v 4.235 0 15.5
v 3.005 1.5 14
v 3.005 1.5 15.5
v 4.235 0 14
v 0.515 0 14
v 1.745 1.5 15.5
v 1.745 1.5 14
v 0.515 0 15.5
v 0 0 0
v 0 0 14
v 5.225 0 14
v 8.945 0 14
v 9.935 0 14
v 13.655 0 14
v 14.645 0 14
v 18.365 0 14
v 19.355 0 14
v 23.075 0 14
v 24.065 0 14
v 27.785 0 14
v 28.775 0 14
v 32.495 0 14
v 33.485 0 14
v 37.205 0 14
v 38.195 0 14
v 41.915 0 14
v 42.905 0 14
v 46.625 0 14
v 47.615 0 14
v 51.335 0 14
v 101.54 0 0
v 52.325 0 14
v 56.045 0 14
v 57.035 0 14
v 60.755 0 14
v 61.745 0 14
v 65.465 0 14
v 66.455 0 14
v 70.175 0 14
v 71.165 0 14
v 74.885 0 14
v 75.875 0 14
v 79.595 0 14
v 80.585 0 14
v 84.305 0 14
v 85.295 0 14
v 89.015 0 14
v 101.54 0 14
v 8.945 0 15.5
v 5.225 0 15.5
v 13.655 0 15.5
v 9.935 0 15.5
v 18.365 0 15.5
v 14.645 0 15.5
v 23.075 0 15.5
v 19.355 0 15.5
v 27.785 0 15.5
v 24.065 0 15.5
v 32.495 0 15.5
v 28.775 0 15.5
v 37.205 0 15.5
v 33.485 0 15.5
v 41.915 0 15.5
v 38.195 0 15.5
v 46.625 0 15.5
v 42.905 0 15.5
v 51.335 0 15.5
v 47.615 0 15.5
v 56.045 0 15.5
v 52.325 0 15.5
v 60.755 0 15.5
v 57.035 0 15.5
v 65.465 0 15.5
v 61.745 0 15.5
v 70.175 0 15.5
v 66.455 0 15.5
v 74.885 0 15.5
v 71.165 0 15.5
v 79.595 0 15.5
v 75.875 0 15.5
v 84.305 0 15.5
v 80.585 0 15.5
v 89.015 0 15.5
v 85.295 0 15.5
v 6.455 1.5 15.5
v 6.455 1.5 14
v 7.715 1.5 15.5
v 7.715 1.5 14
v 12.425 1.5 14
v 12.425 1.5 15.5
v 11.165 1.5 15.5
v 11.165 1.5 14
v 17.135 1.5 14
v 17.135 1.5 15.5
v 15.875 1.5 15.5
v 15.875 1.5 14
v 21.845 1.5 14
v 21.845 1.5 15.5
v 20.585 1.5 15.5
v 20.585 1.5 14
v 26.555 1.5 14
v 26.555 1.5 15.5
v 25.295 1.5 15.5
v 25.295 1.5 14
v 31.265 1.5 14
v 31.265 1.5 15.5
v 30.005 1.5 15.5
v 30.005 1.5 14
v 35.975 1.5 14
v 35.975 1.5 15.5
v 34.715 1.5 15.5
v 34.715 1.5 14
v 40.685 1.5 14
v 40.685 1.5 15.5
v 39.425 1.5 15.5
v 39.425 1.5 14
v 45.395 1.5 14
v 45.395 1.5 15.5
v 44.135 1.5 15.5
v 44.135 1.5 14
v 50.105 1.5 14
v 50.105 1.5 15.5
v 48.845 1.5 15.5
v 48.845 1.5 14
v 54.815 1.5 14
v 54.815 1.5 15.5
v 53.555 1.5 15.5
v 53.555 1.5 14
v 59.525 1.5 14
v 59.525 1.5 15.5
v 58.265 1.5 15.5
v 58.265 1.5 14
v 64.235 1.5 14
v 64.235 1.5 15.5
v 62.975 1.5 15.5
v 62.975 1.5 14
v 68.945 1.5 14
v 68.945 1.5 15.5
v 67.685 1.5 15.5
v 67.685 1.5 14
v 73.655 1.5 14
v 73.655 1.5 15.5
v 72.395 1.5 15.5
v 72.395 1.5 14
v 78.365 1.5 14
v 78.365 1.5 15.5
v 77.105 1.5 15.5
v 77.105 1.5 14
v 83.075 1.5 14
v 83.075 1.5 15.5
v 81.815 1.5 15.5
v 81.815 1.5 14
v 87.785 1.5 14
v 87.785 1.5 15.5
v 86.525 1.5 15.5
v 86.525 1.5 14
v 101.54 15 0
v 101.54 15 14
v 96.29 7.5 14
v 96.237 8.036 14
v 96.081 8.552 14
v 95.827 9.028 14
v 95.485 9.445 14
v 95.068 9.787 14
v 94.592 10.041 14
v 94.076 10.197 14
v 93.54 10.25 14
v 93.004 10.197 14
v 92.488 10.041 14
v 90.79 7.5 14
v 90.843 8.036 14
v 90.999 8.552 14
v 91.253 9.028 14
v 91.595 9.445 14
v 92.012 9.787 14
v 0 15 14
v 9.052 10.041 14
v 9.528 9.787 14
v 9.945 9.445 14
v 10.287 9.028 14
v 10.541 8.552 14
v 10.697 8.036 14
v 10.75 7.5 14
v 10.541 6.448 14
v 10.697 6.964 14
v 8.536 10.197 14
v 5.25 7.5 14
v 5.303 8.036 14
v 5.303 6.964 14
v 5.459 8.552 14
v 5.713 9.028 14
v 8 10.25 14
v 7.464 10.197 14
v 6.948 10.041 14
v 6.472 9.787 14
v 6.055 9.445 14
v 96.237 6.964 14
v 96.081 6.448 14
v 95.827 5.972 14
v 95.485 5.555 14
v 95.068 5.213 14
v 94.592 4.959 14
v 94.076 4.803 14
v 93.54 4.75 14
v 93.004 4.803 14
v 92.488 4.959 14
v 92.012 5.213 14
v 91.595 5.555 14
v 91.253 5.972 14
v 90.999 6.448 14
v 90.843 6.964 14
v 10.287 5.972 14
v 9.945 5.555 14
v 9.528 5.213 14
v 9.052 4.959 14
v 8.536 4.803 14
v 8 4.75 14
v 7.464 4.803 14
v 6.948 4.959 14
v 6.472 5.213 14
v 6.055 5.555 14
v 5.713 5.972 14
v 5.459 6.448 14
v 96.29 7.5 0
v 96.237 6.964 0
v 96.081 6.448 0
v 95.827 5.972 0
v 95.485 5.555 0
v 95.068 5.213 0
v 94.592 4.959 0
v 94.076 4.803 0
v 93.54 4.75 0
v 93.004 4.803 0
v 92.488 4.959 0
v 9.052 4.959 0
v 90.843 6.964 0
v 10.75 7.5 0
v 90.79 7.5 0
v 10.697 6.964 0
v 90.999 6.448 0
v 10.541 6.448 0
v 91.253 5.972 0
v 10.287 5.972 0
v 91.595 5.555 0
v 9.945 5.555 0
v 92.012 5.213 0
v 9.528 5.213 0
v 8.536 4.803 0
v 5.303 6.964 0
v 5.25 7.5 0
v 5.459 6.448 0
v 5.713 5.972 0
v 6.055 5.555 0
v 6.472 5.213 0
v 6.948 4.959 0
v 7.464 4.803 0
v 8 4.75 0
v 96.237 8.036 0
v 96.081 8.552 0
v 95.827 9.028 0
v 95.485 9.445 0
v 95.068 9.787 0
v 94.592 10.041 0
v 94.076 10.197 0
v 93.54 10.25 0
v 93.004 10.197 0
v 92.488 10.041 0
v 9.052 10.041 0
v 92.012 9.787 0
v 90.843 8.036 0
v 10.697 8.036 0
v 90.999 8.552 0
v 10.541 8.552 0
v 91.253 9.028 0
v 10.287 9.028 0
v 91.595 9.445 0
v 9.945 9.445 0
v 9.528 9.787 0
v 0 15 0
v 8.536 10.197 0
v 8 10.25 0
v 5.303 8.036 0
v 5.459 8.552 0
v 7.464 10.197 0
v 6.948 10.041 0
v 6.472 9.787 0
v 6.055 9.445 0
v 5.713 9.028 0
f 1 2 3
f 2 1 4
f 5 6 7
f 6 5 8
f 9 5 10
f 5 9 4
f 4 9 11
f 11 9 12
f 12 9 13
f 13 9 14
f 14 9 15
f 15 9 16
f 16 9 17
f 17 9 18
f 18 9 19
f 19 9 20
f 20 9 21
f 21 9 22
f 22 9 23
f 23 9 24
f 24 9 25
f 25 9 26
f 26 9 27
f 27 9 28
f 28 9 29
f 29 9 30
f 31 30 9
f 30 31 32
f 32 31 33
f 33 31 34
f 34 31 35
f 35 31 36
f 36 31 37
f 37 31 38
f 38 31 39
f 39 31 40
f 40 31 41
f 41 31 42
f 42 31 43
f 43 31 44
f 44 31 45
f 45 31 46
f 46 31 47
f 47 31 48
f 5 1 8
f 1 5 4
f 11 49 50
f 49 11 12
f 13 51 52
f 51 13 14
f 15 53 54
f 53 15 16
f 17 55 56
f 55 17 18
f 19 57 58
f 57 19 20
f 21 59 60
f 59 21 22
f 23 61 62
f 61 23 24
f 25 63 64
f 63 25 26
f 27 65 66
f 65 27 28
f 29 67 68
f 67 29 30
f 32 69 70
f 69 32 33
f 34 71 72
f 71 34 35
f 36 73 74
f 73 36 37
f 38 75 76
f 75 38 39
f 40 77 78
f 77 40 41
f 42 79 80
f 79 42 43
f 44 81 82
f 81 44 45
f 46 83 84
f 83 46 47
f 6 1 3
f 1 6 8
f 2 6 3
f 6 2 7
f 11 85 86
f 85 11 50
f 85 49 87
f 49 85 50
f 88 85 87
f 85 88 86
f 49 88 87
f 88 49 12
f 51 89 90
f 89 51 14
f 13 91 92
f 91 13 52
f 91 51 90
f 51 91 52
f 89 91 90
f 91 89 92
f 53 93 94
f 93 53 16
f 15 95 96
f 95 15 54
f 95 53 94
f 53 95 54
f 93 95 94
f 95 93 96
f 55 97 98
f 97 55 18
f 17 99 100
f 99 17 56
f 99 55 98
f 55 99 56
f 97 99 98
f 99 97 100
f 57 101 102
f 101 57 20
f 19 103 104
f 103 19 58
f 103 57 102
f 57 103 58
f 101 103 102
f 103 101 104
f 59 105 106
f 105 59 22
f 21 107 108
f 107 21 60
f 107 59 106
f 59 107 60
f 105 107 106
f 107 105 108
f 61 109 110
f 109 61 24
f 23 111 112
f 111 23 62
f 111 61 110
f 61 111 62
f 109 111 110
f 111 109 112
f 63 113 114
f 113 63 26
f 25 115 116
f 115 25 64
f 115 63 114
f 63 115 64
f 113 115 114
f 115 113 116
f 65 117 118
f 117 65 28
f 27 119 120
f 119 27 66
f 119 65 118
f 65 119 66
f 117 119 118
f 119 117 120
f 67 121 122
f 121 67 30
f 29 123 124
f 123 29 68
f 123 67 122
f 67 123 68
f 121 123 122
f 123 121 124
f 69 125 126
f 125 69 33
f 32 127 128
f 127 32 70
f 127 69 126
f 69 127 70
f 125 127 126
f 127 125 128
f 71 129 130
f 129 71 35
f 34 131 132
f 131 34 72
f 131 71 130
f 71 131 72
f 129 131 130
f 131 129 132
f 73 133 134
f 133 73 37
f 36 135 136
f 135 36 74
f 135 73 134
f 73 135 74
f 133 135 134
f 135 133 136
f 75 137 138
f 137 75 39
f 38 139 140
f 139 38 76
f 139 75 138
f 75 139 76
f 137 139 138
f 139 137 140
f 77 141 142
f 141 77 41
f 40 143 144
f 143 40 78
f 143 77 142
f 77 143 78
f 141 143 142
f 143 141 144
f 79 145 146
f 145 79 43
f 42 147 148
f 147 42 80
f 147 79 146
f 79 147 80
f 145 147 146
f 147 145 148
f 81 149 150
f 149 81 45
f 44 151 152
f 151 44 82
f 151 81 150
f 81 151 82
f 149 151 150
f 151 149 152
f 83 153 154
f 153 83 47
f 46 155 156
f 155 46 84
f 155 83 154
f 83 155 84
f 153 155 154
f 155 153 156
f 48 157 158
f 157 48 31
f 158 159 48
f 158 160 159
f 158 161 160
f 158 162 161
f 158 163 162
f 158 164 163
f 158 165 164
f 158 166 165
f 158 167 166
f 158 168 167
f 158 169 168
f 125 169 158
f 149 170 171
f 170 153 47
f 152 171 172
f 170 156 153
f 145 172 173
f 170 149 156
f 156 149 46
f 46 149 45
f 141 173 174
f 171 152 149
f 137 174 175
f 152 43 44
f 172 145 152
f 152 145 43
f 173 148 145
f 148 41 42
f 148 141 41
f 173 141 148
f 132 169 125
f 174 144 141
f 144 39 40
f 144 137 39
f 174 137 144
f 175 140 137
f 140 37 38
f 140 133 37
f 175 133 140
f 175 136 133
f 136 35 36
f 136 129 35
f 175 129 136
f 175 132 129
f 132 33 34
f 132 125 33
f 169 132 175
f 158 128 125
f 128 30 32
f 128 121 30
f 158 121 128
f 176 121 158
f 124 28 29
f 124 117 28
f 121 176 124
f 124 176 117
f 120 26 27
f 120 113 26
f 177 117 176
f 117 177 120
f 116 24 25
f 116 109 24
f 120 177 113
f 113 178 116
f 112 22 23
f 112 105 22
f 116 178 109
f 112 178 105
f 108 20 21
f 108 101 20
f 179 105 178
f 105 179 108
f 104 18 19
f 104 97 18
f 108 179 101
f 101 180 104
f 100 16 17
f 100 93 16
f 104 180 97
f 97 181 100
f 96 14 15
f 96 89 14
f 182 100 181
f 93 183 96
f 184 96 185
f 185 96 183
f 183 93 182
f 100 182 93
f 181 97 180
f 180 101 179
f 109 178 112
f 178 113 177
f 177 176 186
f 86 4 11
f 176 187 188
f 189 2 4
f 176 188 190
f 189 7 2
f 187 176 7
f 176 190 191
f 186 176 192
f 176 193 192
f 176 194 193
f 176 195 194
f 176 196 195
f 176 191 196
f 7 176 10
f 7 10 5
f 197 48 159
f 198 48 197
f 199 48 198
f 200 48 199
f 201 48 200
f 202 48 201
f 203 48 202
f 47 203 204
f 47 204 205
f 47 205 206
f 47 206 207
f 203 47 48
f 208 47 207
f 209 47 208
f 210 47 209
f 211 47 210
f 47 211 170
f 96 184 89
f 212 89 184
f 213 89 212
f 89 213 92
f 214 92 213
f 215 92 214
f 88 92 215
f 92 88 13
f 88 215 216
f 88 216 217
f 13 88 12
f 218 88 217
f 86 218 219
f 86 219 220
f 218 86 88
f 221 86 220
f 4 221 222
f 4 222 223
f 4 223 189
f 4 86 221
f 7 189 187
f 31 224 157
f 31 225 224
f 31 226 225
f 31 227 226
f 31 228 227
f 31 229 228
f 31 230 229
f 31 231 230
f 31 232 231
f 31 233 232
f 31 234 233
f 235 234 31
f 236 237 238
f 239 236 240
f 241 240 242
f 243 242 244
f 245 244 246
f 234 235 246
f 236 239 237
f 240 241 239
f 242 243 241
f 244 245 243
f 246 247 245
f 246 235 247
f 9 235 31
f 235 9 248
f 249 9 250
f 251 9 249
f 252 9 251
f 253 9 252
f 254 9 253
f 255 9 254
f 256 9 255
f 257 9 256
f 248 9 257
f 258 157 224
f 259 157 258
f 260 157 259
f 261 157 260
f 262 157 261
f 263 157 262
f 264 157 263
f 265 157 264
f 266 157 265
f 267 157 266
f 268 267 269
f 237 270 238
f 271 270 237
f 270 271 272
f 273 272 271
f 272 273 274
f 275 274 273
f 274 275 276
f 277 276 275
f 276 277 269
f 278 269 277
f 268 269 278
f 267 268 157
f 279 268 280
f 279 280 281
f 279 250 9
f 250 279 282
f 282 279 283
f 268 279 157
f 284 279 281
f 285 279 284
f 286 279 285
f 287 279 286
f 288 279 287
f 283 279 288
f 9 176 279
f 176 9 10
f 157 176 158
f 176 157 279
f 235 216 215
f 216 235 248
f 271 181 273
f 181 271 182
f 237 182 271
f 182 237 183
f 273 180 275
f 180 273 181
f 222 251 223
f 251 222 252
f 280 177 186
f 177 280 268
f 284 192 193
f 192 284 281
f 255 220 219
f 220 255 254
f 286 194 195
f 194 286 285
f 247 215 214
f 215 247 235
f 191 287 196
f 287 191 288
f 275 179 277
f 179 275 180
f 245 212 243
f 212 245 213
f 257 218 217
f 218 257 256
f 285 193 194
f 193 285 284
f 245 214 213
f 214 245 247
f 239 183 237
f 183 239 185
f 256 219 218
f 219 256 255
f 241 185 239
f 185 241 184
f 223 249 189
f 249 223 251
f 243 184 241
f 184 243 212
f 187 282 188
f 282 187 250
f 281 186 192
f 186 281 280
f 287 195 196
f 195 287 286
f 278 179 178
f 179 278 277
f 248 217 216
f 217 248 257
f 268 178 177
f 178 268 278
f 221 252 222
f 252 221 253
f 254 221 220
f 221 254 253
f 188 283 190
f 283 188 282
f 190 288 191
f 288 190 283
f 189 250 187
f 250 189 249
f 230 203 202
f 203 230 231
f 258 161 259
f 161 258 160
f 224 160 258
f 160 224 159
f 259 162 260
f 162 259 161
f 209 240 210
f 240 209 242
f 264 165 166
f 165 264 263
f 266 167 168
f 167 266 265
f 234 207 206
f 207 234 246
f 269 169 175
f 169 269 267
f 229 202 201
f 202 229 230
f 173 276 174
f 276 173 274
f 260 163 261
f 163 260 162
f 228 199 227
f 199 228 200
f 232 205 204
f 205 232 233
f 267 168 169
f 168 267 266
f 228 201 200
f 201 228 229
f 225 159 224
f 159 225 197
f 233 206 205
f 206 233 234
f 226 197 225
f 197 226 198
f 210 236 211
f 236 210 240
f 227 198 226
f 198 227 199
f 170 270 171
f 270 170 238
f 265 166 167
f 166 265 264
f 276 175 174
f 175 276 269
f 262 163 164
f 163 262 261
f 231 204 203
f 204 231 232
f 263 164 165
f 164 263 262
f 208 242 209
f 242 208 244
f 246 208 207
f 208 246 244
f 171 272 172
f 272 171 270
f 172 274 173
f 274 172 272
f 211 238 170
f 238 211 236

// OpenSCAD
$fn = 32;

// ----------------------------------------------------------------------
// Gear rack: m=1.5 z=19, 101.54 x 15 x 15.5 mm
// ----------------------------------------------------------------------

// --- parameters (mm) ---
rack_len = 101.54;        // rack length, X
rack_w = 15;              // rack width, Y
rack_h = 15.5;            // overall height, Z
modul = 1.5;              // module
body_t = 14;              // tooth root line height
pitch = 4.71;             // circular pitch
tip_w = 1.26;             // tooth thickness at the tip
root_w = 3.72;            // tooth thickness at the root line
hole_d = 5.5;             // mounting hole
sink = 0.6;               // tooth root overlap into the body

tooth_span = 89.53;

module tooth(x0) {
  /* 20 deg flank profile, sunk into the body for a positive overlap */
  translate([x0, 0, body_t - sink])
    linear_extrude(height = rack_h - body_t + sink)
      polygon(points = [[-root_w / 2, 0], [root_w / 2, 0],
                        [tip_w / 2, rack_h - body_t],
                        [-tip_w / 2, rack_h - body_t]]);
}

difference() {
  union() {
    cube([rack_len, rack_w, body_t]);
    for (i = [0 : 19 - 1])
      tooth((i + 0.5) * pitch + (tooth_span - 19 * pitch) / 2);
  }
  translate([8, 7.5, -1]) cylinder(h = body_t + 2, d = hole_d);
  translate([93.54, 7.5, -1]) cylinder(h = body_t + 2, d = hole_d);
}
